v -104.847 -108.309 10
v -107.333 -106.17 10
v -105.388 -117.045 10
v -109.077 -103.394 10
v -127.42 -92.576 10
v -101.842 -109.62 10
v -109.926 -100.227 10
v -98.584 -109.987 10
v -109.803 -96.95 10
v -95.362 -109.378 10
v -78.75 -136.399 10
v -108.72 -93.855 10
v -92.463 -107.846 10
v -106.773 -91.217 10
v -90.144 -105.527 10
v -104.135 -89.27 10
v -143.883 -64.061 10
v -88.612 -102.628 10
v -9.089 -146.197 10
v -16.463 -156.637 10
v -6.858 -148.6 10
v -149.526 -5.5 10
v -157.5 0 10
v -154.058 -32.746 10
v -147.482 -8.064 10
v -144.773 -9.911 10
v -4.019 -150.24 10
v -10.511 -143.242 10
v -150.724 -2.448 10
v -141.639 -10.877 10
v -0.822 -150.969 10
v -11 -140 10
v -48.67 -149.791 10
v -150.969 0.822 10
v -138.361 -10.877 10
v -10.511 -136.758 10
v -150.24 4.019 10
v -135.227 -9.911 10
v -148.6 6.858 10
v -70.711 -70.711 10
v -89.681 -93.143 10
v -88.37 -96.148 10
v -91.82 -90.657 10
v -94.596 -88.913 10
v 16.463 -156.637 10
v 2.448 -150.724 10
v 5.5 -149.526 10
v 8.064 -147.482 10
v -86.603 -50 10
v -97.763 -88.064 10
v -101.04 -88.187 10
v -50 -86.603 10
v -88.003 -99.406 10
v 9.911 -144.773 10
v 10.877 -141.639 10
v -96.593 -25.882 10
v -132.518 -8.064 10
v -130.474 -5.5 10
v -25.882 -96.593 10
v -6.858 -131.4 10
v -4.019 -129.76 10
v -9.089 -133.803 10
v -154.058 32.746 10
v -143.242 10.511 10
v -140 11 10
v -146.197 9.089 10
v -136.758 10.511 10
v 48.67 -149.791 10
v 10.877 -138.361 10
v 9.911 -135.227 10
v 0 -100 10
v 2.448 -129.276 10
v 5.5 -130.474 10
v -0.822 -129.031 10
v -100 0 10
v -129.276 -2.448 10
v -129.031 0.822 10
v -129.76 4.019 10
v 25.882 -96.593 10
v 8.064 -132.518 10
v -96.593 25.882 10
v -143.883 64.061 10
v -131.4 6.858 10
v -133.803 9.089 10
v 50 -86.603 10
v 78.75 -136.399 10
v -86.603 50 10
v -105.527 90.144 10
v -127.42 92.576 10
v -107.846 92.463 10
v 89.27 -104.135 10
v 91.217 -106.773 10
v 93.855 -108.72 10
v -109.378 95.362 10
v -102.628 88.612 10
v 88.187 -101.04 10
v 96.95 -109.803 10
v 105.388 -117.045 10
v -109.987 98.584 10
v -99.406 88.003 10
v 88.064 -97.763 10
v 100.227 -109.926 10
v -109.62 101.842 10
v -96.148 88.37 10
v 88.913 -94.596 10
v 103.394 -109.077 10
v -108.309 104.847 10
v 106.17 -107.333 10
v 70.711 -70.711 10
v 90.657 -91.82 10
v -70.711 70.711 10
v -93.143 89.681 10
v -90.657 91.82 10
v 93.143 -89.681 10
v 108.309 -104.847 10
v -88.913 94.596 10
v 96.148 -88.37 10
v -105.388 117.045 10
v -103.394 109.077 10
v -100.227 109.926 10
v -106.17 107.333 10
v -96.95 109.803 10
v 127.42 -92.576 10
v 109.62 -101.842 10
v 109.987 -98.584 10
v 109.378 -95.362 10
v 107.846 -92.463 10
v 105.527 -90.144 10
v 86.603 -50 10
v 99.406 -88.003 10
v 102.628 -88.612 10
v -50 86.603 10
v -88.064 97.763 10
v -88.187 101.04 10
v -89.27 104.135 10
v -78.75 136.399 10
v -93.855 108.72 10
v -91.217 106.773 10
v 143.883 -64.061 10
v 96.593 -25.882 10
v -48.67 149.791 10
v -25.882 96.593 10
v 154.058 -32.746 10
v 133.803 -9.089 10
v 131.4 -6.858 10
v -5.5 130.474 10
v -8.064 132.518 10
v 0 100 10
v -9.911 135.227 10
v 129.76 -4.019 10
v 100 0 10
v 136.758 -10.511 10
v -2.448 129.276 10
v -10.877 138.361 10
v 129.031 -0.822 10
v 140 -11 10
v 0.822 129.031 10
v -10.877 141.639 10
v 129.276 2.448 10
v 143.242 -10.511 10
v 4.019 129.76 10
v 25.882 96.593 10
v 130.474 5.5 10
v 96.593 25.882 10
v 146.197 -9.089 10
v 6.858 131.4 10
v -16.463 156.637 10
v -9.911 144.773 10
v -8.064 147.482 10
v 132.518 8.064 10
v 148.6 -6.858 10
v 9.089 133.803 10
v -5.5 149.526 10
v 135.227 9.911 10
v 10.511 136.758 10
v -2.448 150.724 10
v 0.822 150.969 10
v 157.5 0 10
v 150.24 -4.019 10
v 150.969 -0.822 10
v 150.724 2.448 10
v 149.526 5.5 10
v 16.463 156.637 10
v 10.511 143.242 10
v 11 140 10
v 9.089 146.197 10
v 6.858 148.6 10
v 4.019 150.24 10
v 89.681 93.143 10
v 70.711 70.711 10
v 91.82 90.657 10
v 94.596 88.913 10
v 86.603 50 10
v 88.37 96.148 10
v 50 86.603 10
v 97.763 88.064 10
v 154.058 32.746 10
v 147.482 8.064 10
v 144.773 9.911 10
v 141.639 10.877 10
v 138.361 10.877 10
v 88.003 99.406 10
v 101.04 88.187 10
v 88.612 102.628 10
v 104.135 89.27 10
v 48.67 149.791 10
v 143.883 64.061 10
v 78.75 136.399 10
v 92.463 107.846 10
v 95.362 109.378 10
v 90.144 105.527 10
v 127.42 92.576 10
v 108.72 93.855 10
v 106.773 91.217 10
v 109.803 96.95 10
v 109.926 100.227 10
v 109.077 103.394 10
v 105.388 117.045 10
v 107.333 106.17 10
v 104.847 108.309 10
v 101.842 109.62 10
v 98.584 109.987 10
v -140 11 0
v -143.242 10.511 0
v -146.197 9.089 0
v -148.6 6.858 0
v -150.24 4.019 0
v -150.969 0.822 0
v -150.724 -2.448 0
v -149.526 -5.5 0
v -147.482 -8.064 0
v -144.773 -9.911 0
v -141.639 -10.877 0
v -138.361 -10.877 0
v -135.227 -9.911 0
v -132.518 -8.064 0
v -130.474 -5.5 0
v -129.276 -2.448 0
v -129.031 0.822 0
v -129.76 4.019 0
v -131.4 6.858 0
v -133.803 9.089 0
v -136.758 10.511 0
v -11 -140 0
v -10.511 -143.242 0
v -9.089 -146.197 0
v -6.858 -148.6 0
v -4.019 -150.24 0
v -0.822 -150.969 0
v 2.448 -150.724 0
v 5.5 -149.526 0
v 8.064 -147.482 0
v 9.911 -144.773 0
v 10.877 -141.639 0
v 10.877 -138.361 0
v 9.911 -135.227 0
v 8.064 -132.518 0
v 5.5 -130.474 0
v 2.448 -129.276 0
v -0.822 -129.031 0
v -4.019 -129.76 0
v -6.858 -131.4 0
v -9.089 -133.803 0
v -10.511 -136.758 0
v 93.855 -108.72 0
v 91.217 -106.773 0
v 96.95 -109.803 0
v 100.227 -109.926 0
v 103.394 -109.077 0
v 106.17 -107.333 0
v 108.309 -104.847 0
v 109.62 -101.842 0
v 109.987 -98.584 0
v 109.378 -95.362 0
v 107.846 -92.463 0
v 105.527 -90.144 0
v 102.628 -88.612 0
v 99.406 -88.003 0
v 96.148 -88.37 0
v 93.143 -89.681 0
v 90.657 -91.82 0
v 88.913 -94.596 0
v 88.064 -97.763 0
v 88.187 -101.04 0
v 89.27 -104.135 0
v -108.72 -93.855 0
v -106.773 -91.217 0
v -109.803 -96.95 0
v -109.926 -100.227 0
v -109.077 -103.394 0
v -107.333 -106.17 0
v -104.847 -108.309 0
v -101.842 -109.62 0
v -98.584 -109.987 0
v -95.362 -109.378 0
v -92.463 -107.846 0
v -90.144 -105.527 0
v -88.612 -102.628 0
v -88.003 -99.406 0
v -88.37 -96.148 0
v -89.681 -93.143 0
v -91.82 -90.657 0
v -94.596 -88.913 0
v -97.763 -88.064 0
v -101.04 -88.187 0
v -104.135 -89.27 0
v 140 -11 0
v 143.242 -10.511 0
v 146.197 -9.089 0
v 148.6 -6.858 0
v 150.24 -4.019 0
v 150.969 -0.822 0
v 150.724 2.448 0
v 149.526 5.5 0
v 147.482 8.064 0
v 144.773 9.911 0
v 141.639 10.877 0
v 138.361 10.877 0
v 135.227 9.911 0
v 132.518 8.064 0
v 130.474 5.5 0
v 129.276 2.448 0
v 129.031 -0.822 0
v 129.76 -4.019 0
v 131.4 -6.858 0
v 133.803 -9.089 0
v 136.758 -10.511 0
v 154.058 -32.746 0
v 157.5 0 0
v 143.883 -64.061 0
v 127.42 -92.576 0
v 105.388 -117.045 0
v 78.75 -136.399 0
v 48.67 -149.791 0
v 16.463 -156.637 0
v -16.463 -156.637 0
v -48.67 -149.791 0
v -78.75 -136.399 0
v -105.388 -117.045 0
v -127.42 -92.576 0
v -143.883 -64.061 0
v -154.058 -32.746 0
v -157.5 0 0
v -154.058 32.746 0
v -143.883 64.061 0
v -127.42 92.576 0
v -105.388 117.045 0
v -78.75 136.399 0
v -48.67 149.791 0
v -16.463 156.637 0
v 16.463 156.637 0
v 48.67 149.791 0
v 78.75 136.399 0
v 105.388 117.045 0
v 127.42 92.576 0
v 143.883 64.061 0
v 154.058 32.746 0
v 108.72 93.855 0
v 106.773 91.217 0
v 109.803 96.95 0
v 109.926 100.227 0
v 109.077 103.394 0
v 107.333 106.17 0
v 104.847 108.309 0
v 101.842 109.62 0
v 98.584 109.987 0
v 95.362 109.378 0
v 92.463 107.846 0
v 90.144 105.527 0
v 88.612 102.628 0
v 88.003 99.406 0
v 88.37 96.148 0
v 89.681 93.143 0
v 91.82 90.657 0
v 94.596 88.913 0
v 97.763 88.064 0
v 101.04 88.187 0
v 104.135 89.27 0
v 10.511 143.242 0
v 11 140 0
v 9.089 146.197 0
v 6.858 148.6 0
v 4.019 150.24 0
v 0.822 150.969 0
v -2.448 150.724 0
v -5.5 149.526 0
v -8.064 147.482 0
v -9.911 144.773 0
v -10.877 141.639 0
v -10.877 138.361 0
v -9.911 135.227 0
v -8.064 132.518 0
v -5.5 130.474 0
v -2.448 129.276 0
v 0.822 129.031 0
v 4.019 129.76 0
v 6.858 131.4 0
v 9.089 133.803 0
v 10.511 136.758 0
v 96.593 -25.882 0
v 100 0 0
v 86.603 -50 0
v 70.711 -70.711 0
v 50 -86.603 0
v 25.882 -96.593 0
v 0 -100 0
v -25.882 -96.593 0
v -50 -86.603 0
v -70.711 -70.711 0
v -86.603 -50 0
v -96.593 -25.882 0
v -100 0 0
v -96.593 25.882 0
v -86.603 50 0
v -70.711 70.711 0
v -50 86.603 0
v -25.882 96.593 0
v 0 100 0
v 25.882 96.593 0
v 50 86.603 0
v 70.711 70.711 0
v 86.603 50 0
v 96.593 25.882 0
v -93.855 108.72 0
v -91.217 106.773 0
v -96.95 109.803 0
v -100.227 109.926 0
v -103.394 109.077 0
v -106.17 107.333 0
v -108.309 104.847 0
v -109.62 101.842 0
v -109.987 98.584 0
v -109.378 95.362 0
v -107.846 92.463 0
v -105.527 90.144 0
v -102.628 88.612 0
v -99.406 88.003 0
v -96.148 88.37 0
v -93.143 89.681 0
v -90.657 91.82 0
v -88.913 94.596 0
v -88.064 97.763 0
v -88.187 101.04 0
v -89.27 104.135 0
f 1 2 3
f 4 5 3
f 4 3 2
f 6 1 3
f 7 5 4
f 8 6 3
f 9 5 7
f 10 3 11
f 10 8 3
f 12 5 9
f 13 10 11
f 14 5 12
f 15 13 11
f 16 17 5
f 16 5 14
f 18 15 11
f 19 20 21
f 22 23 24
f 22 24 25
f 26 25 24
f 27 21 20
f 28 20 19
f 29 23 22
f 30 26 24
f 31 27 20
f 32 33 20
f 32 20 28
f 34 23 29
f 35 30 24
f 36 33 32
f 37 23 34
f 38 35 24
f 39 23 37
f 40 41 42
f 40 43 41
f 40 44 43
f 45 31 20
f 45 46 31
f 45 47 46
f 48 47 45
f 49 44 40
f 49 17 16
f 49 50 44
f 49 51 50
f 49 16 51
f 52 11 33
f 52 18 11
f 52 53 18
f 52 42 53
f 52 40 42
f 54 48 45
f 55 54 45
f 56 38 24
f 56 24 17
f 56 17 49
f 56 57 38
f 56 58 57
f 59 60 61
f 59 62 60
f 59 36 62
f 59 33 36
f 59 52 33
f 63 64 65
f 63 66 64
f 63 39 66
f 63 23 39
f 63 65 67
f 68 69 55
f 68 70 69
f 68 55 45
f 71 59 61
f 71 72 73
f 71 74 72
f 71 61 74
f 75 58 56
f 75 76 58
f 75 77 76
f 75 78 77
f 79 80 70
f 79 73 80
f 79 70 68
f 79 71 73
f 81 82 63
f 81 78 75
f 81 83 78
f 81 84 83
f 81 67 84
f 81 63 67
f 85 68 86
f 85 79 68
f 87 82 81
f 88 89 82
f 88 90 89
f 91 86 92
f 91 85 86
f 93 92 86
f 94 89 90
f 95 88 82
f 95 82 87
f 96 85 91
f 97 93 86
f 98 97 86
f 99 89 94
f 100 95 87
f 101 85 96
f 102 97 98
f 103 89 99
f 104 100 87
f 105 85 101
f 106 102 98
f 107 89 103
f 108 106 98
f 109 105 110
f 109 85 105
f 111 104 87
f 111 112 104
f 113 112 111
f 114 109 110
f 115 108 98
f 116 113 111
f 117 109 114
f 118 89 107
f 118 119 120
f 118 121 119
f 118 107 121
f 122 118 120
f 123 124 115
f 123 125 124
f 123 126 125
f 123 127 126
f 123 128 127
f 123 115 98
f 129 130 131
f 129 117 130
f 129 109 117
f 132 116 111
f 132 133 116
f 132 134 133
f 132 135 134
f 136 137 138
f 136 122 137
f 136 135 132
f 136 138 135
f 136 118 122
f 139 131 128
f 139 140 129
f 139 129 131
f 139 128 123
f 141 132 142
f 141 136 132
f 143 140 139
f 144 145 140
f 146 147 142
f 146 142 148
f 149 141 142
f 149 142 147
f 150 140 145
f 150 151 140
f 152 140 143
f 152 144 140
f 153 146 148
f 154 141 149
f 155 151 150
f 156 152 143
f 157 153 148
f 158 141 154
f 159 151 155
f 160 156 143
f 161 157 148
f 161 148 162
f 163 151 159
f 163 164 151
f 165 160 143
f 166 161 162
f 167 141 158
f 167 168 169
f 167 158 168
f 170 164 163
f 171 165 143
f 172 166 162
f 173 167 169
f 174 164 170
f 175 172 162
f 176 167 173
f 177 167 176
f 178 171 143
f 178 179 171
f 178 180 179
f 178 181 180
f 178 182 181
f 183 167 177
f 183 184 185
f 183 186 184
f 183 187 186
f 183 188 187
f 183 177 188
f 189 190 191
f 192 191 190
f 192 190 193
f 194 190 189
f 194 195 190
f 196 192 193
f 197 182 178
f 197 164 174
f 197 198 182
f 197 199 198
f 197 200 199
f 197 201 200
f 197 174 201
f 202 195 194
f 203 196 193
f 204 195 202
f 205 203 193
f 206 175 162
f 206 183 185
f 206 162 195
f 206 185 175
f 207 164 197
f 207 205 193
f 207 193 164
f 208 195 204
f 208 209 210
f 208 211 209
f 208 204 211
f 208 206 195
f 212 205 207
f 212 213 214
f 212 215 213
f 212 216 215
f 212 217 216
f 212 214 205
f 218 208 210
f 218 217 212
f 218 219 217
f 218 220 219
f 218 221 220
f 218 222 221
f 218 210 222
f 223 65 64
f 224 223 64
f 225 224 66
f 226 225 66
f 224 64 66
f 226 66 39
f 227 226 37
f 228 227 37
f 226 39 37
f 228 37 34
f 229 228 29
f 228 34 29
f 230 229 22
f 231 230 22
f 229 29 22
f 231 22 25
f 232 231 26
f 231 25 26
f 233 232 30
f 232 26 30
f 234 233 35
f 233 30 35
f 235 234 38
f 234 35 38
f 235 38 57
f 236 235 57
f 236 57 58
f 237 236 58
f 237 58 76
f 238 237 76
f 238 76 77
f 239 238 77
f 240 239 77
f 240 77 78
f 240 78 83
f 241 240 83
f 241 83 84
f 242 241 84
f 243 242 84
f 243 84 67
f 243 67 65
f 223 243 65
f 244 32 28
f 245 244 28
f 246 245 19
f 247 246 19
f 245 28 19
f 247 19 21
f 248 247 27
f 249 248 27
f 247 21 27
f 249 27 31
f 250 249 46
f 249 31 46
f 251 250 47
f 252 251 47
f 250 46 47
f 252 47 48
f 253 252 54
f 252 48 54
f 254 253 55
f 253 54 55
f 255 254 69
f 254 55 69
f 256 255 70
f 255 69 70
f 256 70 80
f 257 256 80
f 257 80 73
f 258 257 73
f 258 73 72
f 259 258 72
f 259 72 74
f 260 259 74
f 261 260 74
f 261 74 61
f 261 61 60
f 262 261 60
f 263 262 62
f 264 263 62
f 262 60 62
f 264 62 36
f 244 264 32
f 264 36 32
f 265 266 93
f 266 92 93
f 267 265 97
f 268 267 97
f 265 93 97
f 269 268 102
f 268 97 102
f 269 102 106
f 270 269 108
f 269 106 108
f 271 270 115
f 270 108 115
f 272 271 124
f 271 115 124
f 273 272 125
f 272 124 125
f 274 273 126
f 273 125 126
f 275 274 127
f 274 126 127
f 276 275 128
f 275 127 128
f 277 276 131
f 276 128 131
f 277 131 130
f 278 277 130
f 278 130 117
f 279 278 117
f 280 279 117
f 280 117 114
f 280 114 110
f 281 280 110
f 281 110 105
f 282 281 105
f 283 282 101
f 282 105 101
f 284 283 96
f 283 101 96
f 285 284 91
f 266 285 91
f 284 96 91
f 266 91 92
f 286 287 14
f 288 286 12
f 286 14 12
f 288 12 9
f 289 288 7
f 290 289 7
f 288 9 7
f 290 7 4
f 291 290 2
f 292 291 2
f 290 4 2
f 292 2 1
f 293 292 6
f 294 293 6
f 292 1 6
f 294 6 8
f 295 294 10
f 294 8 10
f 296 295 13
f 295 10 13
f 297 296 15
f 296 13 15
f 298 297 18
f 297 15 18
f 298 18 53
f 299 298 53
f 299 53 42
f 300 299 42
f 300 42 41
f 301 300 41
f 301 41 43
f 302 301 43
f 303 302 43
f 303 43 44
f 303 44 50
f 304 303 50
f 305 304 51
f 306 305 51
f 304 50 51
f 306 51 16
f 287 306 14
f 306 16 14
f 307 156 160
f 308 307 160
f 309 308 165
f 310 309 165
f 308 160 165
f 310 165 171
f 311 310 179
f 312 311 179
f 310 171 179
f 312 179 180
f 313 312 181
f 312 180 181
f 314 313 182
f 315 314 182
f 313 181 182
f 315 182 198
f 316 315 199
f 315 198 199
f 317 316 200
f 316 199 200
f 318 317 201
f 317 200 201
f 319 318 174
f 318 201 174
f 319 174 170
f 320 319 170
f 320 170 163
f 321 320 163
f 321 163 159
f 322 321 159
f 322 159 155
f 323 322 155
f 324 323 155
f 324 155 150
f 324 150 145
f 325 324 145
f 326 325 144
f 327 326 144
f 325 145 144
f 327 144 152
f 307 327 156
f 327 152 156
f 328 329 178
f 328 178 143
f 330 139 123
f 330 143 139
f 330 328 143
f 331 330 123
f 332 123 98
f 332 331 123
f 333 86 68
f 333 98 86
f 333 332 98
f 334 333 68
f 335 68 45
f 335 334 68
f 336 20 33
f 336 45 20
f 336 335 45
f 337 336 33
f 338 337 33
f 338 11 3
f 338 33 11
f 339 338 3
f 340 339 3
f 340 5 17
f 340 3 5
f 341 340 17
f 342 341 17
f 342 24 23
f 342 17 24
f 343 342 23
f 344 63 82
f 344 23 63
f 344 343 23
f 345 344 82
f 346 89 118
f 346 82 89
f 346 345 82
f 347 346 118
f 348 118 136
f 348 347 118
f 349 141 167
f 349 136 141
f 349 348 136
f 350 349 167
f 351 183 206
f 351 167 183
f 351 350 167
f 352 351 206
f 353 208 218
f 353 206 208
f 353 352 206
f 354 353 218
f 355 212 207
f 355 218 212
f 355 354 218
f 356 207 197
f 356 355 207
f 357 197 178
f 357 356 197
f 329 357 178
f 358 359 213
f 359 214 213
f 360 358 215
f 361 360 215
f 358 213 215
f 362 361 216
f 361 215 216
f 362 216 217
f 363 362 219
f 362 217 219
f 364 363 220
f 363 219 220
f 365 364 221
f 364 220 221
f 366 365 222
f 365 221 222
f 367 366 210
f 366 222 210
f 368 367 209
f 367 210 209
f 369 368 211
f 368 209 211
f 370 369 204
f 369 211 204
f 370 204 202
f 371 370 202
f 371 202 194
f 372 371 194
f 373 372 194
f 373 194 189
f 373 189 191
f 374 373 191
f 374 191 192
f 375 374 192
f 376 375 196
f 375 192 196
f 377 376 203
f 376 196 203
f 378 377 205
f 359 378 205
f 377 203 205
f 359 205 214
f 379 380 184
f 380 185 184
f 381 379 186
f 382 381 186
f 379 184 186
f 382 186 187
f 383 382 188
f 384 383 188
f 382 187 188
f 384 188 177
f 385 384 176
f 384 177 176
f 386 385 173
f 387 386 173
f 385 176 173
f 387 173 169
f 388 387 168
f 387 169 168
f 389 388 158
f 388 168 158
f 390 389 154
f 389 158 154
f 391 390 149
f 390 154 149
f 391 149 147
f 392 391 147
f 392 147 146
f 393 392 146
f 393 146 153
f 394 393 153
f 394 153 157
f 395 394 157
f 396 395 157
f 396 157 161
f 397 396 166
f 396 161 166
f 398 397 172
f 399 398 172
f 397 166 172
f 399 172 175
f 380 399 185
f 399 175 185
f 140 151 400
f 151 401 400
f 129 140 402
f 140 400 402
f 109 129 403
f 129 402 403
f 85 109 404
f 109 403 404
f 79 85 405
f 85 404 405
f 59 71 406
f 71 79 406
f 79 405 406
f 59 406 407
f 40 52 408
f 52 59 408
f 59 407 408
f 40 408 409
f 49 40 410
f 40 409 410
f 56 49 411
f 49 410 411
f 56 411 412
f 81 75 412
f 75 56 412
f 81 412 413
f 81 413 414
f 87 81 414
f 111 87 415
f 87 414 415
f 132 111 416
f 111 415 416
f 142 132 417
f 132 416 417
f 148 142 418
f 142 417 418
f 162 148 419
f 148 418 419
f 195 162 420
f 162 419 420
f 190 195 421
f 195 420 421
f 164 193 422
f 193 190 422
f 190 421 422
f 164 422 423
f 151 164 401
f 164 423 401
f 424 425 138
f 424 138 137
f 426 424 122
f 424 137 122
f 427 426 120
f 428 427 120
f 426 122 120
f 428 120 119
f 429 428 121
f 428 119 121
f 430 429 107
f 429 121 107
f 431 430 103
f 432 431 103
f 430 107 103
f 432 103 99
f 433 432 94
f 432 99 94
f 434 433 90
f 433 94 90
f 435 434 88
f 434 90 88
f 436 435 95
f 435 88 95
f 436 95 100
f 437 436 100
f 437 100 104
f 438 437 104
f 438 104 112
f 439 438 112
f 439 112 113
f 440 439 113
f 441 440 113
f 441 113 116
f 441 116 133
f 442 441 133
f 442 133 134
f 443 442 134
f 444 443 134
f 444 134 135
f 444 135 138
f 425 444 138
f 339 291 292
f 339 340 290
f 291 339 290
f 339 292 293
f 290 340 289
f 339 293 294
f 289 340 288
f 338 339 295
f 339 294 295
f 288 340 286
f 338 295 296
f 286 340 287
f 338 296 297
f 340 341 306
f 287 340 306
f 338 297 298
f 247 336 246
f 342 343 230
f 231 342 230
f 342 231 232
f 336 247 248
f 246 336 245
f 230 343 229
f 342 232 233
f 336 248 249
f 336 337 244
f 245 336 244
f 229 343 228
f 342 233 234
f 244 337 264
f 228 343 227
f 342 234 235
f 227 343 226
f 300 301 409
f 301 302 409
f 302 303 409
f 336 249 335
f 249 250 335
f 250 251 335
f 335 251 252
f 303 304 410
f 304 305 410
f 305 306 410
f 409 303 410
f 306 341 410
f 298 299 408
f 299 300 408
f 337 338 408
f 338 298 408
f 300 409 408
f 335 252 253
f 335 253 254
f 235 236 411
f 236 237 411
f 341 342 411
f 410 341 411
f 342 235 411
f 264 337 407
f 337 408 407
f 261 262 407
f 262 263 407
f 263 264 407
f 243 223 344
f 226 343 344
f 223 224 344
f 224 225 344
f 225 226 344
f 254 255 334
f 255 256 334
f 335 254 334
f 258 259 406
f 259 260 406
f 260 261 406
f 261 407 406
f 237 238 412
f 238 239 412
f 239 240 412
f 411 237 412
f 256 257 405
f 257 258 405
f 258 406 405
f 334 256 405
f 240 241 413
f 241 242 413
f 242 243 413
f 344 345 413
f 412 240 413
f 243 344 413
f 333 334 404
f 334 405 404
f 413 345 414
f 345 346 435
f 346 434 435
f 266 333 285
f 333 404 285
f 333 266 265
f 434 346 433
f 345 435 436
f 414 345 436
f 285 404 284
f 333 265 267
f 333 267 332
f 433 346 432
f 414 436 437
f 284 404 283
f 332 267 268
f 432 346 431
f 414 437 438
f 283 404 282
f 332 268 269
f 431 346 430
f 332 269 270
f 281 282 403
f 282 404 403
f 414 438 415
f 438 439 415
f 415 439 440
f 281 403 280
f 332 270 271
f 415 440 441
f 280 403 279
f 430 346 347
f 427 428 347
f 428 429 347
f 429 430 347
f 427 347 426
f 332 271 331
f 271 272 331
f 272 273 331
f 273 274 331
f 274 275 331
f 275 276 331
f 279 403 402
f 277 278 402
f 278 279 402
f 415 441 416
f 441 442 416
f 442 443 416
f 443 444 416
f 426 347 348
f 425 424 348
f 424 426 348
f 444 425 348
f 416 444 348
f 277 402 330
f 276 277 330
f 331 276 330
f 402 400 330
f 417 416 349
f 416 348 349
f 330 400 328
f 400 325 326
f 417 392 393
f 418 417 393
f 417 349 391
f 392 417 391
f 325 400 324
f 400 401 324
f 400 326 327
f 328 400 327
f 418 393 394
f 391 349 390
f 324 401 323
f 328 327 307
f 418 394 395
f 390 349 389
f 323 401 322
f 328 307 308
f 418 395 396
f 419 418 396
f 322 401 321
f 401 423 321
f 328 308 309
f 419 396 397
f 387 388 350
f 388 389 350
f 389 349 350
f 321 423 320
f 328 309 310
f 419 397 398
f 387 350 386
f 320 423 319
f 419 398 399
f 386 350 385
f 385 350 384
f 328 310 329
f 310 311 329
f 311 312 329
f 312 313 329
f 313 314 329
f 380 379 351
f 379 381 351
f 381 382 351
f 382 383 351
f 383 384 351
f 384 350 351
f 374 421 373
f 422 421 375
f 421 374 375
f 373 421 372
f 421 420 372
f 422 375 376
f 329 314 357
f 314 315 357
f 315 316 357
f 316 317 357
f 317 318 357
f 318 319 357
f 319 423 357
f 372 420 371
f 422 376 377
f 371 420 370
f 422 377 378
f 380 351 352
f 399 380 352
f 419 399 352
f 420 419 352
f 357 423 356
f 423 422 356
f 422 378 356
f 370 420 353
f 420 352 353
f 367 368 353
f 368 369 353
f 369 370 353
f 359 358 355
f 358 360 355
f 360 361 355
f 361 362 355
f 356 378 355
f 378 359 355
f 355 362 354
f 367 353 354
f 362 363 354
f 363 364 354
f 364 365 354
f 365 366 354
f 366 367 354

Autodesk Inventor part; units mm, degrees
ref_plane "YZ Plane" through (0, 0, 0) normal (1, 0, 0) x (0, 1, 0)
ref_plane "XZ Plane" through (0, 0, 0) normal (0, 1, 0) x (-1, 0, 0)
ref_plane "XY Plane" through (0, 0, 0) normal (0, 0, 1) x (1, 0, 0)
sketch "Sketch1" plane through (0, 0, 0) normal (0, 0, 1) x (1, 0, 0)
  circle A0 centre (0, 0) radius 100
  circle A1 centre (0, 0) radius 157.5
  dimension "d22" = 200
  dimension "d23" = 315
extrude "Plate1" add sketch "Sketch1" along normal blind 10
sketch "Sketch5" plane through (0, 0, 10) normal (0, 0, 1) x (1, 0, 0)
  circle A0 centre (0, 140) radius 11
  circle A1 centre (0, 0) radius 140 construction
  dimension "d25" = 280
  dimension "d24" = 22
extrude "Cut1" cut sketch "Sketch5" against normal blind 10
pattern_circular "Circular Pattern1" count 8 over 360 about axis through (0, 0, 0) along (0, 0, 1) of "Cut1"
equation "\"d26\" = Thickness"
equation "\"d2\" = Thickness"
equation "\"BendReliefDepth\" = 0.5 * Thickness"
equation "\"TransitionRadius\" = BendRadius"
equation "\"JacobiRadiusSize\" = BendRadius"
equation "\"Thickness\" = 10"
equation "\"BendRadius\" = 5"
properties part number "Main filter Flange" material "Stainless Steel"
